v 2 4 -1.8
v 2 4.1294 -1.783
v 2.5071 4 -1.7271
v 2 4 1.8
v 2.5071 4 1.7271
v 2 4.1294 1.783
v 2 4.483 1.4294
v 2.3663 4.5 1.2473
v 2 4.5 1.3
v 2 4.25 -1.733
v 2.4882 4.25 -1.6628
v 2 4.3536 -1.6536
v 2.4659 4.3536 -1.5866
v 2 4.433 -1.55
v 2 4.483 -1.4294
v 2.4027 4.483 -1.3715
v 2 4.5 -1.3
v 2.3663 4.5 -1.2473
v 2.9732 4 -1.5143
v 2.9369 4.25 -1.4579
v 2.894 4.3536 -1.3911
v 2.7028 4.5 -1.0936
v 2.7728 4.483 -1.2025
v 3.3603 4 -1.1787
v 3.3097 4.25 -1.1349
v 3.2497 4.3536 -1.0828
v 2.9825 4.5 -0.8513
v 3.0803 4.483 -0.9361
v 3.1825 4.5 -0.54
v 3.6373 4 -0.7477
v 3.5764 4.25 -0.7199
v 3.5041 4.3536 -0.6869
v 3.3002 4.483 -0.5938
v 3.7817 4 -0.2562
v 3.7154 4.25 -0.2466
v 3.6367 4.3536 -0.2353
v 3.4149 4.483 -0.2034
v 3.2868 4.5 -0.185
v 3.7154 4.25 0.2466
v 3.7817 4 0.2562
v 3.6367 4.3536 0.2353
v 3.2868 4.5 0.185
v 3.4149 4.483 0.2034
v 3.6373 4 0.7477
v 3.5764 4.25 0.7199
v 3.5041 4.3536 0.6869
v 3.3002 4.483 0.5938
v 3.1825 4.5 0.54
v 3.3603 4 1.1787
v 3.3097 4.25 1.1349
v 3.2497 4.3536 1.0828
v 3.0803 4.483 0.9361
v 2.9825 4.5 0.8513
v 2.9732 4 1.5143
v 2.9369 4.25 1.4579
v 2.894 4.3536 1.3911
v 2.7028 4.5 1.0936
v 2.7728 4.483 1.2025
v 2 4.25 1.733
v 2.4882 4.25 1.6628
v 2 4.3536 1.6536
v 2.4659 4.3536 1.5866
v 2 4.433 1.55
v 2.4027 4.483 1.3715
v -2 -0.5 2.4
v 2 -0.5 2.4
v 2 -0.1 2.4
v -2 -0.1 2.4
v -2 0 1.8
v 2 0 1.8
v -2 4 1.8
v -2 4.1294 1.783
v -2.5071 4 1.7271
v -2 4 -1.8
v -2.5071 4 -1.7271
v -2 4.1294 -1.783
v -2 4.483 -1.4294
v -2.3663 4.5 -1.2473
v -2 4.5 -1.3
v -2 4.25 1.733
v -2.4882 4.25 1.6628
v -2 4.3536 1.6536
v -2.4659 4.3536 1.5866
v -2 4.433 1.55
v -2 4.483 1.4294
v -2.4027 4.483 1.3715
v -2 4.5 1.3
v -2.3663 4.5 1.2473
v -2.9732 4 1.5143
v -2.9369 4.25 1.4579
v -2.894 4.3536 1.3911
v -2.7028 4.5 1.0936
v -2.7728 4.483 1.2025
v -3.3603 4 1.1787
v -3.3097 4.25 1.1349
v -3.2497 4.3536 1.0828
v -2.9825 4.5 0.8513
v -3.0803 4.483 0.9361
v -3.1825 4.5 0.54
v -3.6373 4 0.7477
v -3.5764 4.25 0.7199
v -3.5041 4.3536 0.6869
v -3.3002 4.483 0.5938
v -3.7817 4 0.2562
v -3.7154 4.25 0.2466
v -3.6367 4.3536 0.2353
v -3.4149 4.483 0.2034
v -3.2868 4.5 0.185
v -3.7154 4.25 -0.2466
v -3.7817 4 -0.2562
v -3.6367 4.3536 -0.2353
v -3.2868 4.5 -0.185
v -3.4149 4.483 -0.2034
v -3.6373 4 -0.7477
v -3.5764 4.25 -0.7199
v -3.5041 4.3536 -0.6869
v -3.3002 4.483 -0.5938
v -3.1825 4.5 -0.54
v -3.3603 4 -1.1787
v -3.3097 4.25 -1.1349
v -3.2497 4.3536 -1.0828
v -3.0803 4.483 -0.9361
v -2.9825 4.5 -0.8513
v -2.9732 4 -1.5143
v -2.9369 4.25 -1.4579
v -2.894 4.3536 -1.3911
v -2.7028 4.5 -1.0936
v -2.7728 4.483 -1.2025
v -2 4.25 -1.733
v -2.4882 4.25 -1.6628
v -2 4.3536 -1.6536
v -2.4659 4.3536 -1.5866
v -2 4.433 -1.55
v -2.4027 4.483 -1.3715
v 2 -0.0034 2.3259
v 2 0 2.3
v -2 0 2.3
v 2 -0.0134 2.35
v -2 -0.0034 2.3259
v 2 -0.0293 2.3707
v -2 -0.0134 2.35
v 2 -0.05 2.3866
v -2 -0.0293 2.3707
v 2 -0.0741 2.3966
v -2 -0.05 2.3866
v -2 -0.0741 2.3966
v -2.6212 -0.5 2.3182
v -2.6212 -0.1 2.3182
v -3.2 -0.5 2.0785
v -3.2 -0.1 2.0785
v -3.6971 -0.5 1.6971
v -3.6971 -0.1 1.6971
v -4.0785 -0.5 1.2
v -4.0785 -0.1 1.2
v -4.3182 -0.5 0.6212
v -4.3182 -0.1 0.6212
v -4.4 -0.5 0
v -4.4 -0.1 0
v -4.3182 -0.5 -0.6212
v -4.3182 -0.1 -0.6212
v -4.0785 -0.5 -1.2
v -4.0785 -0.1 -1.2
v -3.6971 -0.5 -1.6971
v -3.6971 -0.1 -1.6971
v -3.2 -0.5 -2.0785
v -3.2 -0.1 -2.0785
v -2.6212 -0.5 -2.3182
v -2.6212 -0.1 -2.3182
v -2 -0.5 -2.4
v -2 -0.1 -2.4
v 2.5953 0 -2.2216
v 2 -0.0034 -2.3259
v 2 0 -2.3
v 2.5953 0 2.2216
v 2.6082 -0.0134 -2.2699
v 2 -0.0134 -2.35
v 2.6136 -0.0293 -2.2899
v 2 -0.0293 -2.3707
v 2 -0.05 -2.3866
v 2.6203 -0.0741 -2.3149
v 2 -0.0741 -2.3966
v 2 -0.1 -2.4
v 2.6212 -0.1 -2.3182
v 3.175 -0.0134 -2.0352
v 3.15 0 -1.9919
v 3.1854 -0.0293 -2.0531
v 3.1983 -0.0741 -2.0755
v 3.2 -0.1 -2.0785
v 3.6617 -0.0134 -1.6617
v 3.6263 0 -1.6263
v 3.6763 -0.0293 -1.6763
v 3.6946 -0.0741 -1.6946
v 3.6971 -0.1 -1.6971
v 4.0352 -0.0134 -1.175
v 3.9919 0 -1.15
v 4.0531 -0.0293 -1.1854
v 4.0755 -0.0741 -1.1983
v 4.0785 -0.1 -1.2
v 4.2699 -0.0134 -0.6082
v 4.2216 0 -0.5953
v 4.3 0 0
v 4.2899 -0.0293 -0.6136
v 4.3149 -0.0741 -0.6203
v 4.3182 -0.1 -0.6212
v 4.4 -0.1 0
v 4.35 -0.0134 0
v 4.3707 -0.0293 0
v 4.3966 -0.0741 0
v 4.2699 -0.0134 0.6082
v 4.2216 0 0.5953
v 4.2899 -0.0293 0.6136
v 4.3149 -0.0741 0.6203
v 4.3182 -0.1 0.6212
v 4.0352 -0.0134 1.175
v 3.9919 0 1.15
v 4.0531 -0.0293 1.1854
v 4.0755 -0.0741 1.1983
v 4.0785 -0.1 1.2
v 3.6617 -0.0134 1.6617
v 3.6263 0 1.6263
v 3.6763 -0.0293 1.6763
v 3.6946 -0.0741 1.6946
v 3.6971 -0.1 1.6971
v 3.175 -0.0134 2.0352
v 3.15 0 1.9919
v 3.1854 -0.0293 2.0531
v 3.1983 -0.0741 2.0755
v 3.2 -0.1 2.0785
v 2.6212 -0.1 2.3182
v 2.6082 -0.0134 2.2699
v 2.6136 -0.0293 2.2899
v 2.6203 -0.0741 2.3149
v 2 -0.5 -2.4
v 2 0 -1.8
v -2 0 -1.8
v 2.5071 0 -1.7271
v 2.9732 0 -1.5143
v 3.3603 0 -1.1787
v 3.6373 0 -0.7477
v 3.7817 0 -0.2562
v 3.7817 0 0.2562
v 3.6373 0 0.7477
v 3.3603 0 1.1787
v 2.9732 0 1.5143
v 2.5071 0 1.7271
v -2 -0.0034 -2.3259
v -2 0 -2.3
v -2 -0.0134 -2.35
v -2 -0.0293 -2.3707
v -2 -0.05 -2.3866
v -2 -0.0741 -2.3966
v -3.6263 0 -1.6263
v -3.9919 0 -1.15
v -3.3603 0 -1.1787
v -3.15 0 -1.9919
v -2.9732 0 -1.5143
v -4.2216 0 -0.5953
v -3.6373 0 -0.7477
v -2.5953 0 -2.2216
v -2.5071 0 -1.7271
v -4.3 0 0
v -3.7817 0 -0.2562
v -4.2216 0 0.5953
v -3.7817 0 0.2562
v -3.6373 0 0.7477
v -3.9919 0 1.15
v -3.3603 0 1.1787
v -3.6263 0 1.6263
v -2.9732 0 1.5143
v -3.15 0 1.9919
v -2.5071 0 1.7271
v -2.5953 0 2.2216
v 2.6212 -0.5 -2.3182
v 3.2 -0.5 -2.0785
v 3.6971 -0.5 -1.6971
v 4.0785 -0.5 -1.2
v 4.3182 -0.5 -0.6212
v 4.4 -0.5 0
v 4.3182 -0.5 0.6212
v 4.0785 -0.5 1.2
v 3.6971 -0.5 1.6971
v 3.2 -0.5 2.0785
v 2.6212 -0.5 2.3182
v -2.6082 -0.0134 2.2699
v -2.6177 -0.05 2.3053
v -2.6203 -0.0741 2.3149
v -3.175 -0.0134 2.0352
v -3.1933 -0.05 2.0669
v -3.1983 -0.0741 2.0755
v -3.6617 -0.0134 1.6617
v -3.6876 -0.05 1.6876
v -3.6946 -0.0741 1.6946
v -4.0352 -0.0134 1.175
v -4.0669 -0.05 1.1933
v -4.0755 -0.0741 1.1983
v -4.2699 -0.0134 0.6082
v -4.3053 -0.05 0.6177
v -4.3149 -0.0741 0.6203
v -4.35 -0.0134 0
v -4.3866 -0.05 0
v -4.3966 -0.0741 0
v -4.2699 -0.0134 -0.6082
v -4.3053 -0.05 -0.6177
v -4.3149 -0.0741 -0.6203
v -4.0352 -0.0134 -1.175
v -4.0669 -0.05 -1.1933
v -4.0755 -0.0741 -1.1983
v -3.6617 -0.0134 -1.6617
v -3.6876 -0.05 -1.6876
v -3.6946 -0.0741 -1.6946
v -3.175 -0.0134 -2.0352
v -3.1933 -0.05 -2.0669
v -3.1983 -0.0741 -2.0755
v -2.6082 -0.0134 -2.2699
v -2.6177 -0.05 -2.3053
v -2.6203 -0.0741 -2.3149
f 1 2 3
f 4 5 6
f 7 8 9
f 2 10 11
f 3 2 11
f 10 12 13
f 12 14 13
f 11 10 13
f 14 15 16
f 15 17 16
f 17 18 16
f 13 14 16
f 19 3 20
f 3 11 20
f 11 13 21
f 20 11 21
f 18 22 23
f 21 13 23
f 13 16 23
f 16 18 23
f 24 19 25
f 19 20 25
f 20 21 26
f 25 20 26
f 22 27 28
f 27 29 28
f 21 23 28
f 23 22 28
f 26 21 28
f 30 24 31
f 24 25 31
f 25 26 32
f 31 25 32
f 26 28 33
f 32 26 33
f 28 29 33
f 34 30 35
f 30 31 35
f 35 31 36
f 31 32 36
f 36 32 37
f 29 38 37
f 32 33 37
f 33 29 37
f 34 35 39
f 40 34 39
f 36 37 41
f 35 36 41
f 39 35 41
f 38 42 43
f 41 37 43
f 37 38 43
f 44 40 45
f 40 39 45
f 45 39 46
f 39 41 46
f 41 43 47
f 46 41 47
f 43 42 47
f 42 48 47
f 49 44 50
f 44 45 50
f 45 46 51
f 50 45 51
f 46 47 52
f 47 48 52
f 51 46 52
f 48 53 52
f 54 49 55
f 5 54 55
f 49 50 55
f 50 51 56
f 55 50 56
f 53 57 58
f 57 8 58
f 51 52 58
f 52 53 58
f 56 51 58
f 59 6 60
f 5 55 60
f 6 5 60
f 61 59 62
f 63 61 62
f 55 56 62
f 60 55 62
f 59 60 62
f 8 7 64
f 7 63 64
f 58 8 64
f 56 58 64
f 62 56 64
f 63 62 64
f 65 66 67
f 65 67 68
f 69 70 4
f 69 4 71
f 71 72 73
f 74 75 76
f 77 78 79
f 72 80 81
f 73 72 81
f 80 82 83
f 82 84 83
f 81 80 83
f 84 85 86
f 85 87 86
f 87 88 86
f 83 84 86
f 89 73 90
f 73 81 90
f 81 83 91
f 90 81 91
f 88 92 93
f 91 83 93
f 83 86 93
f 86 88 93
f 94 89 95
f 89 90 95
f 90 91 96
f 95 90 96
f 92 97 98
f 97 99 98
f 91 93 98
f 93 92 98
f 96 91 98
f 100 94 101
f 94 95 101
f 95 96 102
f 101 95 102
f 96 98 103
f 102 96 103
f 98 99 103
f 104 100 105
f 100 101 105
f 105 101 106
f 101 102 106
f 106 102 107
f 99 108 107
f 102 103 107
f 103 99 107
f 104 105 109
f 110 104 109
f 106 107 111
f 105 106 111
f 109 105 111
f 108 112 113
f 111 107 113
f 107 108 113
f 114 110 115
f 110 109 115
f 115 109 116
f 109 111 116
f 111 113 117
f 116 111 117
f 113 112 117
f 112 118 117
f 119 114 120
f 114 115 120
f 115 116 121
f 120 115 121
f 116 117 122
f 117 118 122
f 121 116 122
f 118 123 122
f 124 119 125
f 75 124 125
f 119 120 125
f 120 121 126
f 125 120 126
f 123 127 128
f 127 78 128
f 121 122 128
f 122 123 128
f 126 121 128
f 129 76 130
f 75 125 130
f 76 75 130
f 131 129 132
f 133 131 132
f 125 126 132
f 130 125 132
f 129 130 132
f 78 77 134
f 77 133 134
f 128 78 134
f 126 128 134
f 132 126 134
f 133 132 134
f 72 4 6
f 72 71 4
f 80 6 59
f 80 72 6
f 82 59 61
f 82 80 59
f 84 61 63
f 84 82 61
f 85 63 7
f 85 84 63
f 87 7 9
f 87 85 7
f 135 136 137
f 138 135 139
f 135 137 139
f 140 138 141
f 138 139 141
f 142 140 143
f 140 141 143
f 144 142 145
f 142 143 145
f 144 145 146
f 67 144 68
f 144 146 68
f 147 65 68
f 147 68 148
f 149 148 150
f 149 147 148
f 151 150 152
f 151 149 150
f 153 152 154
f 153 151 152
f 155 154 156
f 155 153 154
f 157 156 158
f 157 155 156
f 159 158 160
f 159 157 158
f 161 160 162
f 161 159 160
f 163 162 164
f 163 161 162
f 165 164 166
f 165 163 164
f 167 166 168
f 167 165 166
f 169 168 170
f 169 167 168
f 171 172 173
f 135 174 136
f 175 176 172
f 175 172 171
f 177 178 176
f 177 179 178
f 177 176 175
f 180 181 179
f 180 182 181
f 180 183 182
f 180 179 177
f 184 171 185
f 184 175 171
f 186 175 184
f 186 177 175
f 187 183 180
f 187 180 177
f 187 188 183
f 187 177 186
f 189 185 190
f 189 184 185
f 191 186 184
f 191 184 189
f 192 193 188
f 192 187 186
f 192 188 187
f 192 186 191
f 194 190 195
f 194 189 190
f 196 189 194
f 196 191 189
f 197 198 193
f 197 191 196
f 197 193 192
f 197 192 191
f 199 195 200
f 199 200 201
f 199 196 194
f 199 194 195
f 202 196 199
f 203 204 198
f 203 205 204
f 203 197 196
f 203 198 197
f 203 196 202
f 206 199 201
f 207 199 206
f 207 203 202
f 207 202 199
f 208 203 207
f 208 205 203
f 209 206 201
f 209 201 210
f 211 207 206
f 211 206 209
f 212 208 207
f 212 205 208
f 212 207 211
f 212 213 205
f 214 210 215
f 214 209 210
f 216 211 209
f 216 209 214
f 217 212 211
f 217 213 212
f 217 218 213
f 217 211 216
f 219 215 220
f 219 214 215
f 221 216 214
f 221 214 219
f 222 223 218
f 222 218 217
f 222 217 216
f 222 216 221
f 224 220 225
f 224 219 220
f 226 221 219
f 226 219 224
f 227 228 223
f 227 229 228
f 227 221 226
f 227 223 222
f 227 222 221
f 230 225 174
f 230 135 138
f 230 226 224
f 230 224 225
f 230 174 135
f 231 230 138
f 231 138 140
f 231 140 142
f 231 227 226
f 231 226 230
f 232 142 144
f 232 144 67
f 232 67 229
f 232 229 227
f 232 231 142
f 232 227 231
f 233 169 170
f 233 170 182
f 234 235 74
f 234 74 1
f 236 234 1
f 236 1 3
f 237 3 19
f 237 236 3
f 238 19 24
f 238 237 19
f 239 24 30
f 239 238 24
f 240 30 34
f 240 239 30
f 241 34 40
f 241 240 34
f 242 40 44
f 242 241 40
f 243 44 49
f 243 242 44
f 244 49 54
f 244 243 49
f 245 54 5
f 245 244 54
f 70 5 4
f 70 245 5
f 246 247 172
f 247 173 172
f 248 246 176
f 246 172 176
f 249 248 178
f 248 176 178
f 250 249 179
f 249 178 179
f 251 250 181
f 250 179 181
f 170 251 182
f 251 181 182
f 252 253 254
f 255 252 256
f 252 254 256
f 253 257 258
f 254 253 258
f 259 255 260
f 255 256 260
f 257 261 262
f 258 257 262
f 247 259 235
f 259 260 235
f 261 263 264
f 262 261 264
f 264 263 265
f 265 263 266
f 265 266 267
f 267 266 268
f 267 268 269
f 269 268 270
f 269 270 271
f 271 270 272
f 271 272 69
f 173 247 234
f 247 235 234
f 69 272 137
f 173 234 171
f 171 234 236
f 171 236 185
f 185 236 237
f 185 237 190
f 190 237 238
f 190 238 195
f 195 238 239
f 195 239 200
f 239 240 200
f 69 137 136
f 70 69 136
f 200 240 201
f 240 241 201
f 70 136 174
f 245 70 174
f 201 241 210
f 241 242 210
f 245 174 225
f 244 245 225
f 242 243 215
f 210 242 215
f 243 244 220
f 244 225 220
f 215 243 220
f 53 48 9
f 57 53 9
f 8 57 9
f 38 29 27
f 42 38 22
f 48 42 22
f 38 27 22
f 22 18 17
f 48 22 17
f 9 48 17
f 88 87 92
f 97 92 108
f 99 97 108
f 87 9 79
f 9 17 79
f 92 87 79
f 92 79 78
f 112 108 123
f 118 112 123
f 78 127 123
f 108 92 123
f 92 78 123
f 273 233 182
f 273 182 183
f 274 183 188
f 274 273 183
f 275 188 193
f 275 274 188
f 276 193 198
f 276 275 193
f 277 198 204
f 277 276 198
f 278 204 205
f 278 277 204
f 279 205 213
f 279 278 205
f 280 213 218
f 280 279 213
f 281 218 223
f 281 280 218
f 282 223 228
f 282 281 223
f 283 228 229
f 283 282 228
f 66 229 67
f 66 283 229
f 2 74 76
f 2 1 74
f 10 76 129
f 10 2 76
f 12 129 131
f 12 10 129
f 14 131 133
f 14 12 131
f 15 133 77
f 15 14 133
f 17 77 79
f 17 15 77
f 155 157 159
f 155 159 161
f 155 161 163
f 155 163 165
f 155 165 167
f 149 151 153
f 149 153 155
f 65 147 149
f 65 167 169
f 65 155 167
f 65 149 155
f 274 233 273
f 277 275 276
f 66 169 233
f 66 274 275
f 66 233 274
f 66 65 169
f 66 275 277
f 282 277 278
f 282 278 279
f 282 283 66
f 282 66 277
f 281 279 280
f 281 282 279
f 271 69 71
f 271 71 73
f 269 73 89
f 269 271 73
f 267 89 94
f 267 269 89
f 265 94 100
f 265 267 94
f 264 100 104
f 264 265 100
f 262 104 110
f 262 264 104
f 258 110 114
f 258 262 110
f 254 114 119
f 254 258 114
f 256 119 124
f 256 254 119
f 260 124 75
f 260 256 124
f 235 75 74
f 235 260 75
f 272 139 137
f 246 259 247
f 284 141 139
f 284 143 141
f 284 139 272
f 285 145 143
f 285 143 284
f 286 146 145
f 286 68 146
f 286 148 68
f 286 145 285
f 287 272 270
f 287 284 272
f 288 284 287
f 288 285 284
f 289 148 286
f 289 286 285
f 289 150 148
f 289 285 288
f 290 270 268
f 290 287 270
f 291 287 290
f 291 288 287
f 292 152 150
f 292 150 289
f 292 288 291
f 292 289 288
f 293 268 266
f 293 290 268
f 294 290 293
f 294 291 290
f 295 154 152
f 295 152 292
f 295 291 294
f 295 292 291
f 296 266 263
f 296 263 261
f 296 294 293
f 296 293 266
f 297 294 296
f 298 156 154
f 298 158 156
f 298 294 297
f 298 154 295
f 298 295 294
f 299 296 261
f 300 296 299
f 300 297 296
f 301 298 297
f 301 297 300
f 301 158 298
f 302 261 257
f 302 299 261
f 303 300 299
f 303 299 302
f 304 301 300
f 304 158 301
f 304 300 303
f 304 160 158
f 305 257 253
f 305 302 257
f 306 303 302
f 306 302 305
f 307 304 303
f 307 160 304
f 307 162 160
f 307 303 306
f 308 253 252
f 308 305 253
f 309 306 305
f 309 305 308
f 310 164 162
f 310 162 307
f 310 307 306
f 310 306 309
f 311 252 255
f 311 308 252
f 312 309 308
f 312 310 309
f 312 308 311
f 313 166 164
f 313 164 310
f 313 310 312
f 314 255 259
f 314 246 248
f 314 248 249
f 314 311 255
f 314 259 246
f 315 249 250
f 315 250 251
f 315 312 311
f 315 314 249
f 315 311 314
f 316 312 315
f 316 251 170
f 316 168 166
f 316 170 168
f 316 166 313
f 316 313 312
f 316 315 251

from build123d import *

# Parameters (mm, degrees)
BOSS_EXTRUDE1_DEPTH = 4.5
BOSS_EXTRUDE2_START = 0.5
BOSS_EXTRUDE2_DEPTH = 0.5
FILLET1_R           = 0.5
FILLET2_R           = 0.1


with BuildPart() as part:
    # Sketch1 → Boss-Extrude1 (new body)
    with BuildSketch(Plane(origin=(0, 0, 0), x_dir=(1, 0, 0), z_dir=(0, 1, 0))):
        with BuildLine():
            Line((-2, 1.8), (2, 1.8))
            ThreePointArc((2, 1.8), (3.8, 0), (2, -1.8))
            Line((2, -1.8), (-2, -1.8))
            ThreePointArc((-2, -1.8), (-3.8, 0), (-2, 1.8))
        make_face()
    extrude(amount=BOSS_EXTRUDE1_DEPTH)

    # Sketch2 → Boss-Extrude2 (add)
    # profile 1 of 2: a face of its own
    with BuildSketch(Plane.XZ.offset(BOSS_EXTRUDE2_START)):
        with BuildLine():
            Line((-2, -2.4), (2, -2.4))
            ThreePointArc((2, -2.4), (4.4, 0), (2, 2.4))
            Line((2, 2.4), (-2, 2.4))
            ThreePointArc((-2, 2.4), (-4.4, 0), (-2, -2.4))
        make_face()
        with BuildLine():
            ThreePointArc((-2, 1.8), (-3.8, 0), (-2, -1.8))
            Line((-2, -1.8), (2, -1.8))
            ThreePointArc((2, -1.8), (3.8, 0), (2, 1.8))
            Line((2, 1.8), (-2, 1.8))
        make_face(mode=Mode.SUBTRACT)
    # profile 2 of 2: a face of its own
    with BuildSketch(Plane.XZ.offset(BOSS_EXTRUDE2_START)):
        with BuildLine():
            Line((2, 1.8), (-2, 1.8))
            ThreePointArc((-2, 1.8), (-3.8, 0), (-2, -1.8))
            Line((-2, -1.8), (2, -1.8))
            ThreePointArc((2, -1.8), (3.8, 0), (2, 1.8))
        make_face()
    extrude(amount=-BOSS_EXTRUDE2_DEPTH)

    # Fillet1
    fillet1_edges = [part.edges().sort_by_distance(p)[0] for p in [
        (3.8, 4.5, 0),
        (0, 4.5, -1.8),
        (-3.8, 4.5, 0),
        (0, 4.5, 1.8),
    ]]
    fillet(fillet1_edges, radius=FILLET1_R)

    # Fillet2
    fillet2_edges = [part.edges().sort_by_distance(p)[0] for p in [
        (0, 0, -2.4),
        (4.4, 0, 0),
        (0, 0, 2.4),
        (-4.4, 0, 0),
    ]]
    fillet(fillet2_edges, radius=FILLET2_R)


solid = part.part
